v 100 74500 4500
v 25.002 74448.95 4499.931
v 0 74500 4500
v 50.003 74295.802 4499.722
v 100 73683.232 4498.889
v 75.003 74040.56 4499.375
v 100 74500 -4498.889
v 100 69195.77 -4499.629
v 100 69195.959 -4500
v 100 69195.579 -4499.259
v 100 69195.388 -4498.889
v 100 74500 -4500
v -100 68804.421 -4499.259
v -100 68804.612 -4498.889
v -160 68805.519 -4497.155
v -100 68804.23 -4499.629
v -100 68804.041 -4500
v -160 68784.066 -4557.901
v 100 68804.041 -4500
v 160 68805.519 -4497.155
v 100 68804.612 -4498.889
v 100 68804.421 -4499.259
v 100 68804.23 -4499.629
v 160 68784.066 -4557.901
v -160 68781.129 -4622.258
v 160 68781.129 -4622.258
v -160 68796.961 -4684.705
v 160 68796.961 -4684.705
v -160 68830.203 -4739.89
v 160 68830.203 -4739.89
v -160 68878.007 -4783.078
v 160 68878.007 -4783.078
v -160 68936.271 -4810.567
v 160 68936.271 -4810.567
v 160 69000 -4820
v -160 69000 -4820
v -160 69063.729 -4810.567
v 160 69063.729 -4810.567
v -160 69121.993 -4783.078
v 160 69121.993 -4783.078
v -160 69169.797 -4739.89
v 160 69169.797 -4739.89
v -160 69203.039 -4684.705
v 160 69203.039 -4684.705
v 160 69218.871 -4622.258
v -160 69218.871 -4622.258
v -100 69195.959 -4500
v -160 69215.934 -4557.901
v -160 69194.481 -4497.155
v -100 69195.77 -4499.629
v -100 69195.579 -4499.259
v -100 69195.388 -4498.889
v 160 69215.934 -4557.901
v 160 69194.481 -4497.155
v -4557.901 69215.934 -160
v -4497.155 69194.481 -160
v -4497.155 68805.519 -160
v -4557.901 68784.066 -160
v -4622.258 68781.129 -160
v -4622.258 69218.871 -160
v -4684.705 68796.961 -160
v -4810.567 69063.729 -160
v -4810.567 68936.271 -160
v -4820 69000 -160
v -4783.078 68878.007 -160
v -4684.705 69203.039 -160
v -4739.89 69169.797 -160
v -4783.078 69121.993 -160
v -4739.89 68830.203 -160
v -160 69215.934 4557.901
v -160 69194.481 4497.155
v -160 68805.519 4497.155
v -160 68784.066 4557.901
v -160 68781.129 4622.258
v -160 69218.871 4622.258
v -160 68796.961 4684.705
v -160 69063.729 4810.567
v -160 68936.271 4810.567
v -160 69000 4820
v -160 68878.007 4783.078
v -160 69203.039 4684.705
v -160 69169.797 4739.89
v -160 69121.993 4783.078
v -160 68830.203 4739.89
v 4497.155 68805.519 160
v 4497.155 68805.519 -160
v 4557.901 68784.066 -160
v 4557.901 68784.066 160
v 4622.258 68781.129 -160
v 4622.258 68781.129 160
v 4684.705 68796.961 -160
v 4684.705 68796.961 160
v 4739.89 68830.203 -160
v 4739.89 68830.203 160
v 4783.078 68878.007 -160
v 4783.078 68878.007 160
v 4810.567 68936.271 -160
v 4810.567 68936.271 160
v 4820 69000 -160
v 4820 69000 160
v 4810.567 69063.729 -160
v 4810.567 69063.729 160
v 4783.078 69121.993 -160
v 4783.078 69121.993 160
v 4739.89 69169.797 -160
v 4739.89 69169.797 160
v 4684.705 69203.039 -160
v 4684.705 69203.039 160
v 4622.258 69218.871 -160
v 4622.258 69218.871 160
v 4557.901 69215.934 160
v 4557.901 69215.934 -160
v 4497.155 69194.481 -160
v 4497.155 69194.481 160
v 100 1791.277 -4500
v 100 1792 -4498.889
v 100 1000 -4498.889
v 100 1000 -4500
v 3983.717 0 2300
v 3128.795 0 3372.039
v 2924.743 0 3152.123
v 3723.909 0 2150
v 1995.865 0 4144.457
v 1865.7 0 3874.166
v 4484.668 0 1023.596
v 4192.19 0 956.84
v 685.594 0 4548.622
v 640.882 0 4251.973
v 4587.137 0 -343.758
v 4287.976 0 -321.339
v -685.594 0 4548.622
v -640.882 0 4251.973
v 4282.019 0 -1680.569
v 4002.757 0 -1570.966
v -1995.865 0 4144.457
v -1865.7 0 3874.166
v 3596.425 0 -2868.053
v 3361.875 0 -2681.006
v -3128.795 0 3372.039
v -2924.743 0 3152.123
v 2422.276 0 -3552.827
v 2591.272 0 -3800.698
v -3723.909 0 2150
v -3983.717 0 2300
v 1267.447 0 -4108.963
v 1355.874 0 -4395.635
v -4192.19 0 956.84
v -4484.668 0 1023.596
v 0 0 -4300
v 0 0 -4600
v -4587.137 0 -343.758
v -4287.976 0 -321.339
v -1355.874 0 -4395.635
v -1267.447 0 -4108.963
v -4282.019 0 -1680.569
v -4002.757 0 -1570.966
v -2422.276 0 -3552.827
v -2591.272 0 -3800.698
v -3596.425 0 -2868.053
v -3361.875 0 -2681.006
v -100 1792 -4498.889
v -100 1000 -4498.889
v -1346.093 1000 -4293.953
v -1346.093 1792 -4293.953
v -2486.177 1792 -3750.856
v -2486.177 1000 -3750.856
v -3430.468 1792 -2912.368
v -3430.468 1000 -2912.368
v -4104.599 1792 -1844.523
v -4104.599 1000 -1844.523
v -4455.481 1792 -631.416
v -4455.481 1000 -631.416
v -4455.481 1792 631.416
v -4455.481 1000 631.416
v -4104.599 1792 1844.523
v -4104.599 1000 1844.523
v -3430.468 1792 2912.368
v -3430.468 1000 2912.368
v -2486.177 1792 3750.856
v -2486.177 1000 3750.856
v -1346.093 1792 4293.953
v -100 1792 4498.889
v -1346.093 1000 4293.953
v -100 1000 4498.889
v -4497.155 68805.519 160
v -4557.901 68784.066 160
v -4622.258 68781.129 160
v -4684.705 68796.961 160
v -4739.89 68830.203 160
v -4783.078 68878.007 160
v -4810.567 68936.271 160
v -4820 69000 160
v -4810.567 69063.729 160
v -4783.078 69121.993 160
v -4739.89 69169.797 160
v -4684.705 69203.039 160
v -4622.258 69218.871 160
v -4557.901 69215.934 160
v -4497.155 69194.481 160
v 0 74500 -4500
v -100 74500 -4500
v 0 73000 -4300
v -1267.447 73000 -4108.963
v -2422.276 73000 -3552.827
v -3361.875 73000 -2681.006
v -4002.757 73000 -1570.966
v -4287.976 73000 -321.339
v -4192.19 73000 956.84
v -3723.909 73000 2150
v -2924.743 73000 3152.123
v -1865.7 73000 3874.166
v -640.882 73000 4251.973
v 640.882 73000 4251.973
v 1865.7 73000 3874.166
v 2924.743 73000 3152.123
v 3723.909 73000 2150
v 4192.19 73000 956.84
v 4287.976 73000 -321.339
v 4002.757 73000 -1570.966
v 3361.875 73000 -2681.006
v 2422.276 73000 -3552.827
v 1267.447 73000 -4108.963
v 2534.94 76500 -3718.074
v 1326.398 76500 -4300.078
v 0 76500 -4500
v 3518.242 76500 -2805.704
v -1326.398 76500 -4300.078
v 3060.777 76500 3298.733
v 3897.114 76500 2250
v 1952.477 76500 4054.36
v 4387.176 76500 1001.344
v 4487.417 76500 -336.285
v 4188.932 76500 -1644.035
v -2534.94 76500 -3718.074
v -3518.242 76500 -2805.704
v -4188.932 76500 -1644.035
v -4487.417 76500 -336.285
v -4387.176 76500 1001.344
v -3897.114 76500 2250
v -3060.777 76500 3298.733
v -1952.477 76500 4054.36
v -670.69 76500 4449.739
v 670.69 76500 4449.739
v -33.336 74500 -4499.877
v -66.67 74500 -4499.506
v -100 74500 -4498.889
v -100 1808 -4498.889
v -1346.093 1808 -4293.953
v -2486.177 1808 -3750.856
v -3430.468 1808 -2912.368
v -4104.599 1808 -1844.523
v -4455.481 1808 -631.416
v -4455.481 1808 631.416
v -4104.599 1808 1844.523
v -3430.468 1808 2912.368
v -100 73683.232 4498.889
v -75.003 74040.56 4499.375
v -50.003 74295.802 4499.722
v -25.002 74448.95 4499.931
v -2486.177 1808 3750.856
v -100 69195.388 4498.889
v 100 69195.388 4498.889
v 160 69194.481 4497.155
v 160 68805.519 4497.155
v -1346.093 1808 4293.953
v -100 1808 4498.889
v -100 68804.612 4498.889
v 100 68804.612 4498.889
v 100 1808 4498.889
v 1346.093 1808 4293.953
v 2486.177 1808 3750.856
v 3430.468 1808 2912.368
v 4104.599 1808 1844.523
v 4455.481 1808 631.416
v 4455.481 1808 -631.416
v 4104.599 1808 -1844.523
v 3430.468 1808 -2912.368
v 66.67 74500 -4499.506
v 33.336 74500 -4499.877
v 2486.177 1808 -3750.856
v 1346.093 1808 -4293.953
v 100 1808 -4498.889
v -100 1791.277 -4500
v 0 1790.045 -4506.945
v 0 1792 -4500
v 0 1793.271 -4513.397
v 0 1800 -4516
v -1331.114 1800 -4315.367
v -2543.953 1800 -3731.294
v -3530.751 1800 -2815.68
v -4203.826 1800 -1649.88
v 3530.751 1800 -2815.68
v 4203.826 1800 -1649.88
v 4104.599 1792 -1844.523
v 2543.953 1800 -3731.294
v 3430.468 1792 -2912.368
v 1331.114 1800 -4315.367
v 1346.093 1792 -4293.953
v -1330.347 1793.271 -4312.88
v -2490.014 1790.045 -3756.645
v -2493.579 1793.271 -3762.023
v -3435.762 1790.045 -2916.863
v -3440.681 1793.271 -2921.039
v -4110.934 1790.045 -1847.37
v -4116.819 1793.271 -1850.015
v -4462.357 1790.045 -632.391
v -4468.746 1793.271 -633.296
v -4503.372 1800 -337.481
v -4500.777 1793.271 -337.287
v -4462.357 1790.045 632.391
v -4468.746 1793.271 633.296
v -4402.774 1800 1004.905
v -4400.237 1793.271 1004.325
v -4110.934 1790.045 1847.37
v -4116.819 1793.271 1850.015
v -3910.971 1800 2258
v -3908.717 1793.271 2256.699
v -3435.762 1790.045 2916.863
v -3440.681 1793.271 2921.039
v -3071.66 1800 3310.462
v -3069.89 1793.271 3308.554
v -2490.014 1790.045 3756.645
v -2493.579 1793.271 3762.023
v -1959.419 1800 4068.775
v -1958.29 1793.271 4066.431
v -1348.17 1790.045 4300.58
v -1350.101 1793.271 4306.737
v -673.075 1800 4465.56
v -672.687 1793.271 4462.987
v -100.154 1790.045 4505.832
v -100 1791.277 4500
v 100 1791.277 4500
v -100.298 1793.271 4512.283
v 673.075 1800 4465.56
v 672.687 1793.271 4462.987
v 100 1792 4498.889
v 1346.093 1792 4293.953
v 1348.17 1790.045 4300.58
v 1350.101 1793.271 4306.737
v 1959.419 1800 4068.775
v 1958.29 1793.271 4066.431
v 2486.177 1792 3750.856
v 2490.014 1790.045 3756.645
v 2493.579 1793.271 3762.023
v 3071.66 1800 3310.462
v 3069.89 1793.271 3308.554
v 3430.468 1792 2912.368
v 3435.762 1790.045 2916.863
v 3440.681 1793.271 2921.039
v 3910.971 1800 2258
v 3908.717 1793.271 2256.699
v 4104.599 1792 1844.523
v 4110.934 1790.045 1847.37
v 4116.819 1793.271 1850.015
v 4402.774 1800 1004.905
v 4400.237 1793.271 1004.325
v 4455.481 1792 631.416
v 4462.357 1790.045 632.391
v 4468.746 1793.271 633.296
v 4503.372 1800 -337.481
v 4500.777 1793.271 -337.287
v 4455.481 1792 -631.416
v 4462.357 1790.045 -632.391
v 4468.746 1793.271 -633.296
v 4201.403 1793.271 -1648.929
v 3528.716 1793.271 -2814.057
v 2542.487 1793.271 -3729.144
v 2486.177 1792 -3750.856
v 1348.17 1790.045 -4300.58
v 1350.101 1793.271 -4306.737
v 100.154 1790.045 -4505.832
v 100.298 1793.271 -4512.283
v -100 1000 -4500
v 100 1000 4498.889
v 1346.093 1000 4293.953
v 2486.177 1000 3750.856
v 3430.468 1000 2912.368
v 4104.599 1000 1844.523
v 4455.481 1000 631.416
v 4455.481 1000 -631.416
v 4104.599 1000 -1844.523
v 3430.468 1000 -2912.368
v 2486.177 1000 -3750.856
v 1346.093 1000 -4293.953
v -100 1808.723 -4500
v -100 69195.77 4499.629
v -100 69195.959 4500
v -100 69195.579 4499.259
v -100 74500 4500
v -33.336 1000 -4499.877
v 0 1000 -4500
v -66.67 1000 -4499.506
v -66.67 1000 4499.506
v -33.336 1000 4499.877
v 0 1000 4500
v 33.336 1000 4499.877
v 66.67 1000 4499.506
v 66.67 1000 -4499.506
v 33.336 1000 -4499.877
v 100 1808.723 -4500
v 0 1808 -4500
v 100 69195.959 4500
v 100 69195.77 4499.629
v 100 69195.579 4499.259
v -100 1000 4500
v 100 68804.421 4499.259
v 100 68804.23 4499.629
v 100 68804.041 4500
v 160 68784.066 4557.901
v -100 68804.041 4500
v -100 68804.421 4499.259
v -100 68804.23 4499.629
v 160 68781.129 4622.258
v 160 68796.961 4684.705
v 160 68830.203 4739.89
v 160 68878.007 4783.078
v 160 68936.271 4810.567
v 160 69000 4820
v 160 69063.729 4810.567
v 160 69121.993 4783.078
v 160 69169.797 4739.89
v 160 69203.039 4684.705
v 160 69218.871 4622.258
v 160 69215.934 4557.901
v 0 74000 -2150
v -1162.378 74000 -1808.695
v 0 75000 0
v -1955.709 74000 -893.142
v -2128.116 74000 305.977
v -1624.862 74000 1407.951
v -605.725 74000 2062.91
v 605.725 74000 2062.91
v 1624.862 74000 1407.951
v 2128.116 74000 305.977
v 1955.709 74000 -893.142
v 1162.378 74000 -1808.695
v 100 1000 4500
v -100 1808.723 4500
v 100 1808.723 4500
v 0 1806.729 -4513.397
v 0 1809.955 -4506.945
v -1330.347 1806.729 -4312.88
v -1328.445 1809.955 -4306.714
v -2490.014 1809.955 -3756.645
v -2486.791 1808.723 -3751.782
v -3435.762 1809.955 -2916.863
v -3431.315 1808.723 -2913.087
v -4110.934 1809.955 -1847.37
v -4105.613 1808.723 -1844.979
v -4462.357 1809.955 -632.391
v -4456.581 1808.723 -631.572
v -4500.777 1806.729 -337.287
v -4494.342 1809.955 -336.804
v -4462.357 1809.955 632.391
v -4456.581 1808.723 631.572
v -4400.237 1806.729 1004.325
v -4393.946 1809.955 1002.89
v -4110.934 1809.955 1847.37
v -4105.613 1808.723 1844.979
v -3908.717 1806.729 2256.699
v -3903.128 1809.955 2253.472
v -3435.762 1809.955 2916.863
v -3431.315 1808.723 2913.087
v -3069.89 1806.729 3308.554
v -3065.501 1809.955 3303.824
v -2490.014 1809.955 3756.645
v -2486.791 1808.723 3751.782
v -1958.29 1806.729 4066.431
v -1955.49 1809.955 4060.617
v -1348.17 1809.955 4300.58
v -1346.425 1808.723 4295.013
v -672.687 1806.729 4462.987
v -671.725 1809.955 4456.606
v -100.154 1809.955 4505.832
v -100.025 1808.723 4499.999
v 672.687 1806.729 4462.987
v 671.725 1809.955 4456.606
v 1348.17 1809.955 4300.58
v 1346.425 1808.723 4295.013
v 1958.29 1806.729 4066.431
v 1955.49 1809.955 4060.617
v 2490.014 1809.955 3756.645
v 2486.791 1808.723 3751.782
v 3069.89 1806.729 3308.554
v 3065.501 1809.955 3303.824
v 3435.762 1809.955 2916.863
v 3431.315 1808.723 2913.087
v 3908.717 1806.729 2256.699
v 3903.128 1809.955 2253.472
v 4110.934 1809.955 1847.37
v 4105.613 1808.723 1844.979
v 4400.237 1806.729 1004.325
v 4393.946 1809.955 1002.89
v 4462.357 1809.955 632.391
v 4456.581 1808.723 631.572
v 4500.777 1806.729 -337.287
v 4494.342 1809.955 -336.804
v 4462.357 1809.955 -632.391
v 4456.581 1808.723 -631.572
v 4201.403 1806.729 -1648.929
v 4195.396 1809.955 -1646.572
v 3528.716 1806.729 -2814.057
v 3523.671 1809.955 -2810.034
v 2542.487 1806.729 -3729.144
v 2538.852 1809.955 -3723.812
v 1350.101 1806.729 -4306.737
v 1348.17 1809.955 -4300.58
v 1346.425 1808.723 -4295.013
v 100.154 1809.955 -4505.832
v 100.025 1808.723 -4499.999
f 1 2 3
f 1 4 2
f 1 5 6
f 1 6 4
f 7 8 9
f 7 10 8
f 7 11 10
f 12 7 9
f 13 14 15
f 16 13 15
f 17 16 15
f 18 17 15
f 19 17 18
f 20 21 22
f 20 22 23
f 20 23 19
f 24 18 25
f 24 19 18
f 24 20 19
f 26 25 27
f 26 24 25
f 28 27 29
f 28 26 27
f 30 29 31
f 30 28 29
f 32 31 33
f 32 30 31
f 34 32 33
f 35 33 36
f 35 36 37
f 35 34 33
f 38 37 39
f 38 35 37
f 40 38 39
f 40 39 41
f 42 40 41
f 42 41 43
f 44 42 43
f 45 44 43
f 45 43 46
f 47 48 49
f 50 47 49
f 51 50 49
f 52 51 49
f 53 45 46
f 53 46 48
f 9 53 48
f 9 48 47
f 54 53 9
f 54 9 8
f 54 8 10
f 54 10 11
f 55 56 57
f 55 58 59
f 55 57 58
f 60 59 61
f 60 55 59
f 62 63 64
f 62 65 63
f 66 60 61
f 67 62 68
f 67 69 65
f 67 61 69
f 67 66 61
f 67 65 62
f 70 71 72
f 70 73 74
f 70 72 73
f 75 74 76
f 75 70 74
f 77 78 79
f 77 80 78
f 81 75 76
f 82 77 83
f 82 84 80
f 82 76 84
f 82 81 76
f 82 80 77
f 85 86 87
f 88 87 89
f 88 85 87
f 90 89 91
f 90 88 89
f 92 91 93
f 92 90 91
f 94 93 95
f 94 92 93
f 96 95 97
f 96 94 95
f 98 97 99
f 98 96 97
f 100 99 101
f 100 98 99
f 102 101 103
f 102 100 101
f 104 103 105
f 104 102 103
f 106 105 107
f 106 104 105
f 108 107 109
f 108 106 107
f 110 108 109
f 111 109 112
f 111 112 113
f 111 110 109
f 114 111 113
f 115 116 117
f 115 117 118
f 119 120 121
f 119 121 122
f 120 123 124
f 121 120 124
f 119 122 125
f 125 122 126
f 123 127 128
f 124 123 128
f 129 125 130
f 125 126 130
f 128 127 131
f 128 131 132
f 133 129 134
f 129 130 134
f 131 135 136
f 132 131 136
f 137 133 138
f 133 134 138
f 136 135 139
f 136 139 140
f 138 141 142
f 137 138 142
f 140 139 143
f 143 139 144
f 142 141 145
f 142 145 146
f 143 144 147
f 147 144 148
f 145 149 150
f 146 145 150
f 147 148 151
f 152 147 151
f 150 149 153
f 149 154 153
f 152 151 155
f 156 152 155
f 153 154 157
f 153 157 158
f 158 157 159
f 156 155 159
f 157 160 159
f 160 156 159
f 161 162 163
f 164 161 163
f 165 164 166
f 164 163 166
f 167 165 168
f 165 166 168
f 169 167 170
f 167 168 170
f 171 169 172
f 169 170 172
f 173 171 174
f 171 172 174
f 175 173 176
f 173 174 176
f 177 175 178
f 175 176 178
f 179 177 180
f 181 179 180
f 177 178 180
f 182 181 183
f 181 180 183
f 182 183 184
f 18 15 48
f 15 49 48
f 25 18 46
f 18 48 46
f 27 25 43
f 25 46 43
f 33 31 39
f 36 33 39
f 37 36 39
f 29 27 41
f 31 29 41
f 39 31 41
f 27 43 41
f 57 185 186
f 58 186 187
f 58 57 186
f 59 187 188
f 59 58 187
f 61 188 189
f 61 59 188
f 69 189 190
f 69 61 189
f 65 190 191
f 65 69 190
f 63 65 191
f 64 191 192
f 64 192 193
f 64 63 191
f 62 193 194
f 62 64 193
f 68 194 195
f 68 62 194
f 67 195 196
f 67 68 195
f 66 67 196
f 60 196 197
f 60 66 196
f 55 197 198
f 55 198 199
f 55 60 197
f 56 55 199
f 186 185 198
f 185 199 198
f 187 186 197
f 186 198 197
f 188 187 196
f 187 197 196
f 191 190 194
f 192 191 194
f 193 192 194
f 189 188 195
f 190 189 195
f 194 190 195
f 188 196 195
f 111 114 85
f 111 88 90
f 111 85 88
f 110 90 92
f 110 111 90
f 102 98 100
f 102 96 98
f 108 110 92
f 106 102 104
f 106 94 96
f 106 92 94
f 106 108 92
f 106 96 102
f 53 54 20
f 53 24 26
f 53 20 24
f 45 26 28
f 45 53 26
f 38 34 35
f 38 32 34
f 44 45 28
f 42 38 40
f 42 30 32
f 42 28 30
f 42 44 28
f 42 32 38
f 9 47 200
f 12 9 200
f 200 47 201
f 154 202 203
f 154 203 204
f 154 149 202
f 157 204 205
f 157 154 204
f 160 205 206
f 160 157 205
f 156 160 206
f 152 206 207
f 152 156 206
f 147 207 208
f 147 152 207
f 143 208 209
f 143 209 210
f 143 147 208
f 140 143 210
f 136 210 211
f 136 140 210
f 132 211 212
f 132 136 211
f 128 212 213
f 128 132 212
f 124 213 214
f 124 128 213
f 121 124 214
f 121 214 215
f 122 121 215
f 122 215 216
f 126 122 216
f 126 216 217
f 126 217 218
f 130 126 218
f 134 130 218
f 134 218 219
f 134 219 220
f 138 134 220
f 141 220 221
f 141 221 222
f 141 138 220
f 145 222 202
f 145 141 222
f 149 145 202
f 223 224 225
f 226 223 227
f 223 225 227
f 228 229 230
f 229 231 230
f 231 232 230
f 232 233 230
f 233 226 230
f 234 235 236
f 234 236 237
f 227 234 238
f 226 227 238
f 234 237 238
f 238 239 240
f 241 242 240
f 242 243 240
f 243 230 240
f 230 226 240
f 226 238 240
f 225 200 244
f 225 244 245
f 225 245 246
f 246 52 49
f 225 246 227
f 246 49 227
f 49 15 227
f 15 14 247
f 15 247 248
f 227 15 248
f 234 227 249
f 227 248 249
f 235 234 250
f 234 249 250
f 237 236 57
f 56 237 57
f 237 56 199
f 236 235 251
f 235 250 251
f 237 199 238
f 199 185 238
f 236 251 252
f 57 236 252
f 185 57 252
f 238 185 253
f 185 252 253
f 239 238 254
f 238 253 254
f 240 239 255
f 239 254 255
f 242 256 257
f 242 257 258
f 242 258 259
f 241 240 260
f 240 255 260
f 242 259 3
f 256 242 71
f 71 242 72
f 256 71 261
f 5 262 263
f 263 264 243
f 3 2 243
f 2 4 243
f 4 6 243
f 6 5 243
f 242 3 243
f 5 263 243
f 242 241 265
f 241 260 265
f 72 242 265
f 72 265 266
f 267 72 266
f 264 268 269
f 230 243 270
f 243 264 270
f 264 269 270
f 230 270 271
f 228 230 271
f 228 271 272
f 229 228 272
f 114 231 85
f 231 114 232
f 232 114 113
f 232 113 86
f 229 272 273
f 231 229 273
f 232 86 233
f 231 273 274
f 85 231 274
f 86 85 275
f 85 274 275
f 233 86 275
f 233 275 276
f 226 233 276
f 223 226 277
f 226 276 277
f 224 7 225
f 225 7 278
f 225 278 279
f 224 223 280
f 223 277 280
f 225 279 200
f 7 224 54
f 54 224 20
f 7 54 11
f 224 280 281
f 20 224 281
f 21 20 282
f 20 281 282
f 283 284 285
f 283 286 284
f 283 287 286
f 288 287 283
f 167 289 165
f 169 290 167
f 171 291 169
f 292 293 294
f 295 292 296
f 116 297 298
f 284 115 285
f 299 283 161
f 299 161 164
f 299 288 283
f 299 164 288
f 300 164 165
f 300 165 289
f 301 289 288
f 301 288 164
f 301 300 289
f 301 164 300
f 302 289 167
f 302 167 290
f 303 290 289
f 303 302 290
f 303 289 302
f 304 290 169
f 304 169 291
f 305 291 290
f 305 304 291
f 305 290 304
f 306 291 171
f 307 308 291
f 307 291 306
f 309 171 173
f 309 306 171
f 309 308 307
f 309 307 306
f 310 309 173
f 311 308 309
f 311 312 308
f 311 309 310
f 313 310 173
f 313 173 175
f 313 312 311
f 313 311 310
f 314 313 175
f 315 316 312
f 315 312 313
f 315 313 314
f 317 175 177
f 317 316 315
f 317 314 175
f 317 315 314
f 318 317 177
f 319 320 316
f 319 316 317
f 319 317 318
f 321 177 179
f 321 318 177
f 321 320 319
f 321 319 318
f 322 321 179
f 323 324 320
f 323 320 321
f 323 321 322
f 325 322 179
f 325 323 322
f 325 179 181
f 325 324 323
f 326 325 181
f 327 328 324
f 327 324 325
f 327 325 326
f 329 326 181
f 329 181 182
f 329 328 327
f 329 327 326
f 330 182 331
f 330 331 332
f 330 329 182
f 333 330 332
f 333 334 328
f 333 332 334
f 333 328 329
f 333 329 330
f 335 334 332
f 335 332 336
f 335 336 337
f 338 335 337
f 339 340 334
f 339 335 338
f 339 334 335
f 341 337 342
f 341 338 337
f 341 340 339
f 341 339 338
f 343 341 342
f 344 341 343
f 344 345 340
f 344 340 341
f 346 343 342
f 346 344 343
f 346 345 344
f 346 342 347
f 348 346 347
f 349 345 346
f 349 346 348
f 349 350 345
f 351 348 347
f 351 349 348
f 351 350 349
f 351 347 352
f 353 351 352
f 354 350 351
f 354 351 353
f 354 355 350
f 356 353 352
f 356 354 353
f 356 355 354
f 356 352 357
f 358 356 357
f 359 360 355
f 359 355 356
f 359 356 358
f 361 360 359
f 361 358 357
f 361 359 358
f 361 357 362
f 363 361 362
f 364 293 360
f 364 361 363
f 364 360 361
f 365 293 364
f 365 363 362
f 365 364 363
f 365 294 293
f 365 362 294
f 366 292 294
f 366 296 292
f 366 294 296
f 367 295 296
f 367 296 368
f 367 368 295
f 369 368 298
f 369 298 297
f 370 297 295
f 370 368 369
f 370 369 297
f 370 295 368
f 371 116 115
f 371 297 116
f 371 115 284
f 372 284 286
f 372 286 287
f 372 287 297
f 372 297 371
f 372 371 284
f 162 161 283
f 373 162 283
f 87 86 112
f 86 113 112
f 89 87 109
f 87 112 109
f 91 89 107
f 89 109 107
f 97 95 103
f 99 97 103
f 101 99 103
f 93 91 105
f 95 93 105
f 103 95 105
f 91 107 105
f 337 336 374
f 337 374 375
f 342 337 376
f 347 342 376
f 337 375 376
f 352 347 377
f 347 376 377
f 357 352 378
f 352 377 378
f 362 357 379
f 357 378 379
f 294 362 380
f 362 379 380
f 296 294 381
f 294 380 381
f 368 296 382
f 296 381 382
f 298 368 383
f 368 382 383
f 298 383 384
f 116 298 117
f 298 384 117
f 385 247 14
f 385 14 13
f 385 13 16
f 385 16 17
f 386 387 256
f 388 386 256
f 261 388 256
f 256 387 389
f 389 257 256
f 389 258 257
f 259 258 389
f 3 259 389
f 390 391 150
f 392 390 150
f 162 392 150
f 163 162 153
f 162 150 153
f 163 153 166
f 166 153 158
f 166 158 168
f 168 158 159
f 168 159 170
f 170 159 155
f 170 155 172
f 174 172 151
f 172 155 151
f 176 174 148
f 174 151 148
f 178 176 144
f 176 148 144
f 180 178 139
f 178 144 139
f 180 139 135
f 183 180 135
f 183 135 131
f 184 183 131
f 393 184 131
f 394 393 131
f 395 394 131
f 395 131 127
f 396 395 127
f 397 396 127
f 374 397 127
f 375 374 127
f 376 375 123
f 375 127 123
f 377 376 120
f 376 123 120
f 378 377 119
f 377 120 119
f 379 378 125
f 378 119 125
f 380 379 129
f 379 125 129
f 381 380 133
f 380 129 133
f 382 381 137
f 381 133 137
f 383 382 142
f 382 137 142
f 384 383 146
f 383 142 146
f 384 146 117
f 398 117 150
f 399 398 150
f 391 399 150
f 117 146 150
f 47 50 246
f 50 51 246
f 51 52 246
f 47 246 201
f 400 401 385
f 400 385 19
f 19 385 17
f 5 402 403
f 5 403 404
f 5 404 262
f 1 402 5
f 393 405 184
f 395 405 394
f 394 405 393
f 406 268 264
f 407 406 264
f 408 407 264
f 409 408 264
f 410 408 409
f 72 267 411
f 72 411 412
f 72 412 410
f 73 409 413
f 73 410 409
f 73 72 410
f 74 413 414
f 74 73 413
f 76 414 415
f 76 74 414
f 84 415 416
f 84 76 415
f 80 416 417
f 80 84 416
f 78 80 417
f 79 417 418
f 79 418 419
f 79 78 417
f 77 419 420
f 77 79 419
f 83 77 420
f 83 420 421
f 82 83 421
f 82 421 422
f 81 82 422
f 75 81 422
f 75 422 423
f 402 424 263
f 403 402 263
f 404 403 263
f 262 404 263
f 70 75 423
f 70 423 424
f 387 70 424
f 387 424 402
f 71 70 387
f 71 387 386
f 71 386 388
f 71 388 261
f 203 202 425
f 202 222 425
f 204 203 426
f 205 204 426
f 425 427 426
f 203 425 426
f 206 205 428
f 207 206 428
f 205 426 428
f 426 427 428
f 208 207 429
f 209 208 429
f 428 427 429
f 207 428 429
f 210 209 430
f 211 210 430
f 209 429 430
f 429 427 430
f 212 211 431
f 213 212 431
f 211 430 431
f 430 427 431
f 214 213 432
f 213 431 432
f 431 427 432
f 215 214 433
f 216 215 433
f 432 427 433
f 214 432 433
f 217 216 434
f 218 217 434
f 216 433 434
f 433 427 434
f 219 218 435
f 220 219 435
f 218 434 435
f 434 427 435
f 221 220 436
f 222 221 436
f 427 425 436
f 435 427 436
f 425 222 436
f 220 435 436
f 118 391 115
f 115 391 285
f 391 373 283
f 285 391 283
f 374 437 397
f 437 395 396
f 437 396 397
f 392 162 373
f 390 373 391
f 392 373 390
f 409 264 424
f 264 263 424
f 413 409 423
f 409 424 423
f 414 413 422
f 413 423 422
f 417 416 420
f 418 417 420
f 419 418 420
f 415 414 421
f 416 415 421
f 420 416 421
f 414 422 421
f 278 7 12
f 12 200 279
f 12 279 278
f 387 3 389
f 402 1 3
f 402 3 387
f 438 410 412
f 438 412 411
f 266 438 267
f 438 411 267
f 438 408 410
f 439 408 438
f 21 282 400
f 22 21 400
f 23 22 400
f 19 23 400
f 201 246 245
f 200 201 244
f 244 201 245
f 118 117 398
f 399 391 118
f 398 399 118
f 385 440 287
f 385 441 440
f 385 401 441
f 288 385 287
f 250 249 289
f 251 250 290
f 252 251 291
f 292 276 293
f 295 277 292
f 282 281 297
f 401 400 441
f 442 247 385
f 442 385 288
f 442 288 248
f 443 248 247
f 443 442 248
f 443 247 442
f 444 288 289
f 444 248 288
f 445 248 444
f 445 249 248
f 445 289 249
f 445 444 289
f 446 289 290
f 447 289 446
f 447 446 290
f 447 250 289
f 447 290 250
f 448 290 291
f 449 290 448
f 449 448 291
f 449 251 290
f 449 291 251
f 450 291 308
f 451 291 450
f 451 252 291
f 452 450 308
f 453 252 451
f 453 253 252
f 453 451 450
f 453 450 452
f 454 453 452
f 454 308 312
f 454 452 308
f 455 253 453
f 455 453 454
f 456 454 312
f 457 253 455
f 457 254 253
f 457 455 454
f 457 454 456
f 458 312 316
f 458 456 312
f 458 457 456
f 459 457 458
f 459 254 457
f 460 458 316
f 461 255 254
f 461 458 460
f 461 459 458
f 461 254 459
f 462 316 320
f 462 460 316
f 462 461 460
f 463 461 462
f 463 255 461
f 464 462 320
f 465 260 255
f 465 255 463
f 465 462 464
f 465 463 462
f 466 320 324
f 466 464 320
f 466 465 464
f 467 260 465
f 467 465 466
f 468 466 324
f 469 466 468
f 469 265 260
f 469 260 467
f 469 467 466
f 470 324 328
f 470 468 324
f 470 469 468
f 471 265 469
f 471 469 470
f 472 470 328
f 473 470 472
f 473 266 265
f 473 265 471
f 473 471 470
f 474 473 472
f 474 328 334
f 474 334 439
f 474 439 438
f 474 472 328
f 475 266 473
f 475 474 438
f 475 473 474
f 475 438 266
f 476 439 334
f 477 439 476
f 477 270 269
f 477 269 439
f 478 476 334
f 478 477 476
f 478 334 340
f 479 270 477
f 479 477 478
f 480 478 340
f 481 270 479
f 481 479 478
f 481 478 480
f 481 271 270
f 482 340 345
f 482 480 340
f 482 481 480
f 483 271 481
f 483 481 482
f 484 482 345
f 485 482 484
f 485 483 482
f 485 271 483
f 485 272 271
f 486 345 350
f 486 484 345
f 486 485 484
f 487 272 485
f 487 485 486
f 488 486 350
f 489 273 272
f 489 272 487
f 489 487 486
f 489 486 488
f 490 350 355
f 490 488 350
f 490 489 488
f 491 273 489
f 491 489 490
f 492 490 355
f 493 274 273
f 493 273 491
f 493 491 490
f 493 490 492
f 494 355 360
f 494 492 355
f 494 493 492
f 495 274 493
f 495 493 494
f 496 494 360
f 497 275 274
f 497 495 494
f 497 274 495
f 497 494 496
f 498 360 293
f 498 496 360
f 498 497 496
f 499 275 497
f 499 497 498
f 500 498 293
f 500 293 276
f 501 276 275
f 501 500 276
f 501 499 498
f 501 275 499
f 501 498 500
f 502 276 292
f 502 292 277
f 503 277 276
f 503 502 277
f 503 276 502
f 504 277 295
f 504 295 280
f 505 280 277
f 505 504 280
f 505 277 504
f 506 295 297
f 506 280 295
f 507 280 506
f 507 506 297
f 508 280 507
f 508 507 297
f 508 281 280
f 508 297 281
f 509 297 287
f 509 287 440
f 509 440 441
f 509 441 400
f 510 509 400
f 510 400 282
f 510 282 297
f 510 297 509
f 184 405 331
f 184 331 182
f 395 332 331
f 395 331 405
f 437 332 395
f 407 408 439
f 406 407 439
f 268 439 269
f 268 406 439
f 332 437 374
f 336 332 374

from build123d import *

# Parameters (mm, degrees)
SKETCH2_R           = 10
SKETCH6_R           = 220
BOSS_EXTRUDE1_DEPTH = 160
CIRPATTERN1_COUNT   = 4
SKETCH7_W           = 100
SKETCH7_H           = 73500
BOSS_EXTRUDE2_DEPTH = 100


with BuildPart() as part:
    # Sketch1 → Revolve1 (revolve)
    with BuildSketch(Plane.XY, mode=Mode.PRIVATE) as revolve1_sk:
        Polygon((0, 76500), (4500, 76500), (4500, 1000), (4600, 0), (4300, 0), (4300, 1000), (4300, 73000), (0, 75000), align=None)
    revolve(revolve1_sk.sketch.rotate(Axis((0, 0, 0), (0, 1, 0)), 90), axis=Axis((0, 0, 0), (0, 1, 0)))

    # Sketch2 → Revolve2 (revolve)
    with BuildSketch(Plane.XY, mode=Mode.PRIVATE) as revolve2_sk:
        with Locations((4506, 1800)):
            Circle(SKETCH2_R)
    revolve(revolve2_sk.sketch.rotate(Axis((0, 0, 0), (0, 1, 0)), 90), axis=Axis((0, 0, 0), (0, 1, 0)))

    # Sketch6 → Boss-Extrude1 (add, symmetric)
    with BuildSketch(Plane.XY):
        with Locations((4600, 69000)):
            Circle(SKETCH6_R)
    boss_extrude1 = extrude(amount=BOSS_EXTRUDE1_DEPTH, both=True)

    # CirPattern1: Boss-Extrude1 ×4 about axis
    cirpattern1_axis = Axis((0, 0, 0), (0, 1, 0))
    for i in range(1, CIRPATTERN1_COUNT):
        add(boss_extrude1.rotate(cirpattern1_axis, i * 360 / CIRPATTERN1_COUNT))

    # Sketch7 → Boss-Extrude2 (add, symmetric)
    with BuildSketch(Plane(origin=(0, 0, 0), x_dir=(0, 0, -1), z_dir=(1, 0, 0))):
        with Locations((4450, 37750)):
            Rectangle(SKETCH7_W, SKETCH7_H)
        Polygon((-4500, 74500), (-4500, 1000), (-4400, 1000), align=None)
    extrude(amount=BOSS_EXTRUDE2_DEPTH, both=True)


solid = part.part
